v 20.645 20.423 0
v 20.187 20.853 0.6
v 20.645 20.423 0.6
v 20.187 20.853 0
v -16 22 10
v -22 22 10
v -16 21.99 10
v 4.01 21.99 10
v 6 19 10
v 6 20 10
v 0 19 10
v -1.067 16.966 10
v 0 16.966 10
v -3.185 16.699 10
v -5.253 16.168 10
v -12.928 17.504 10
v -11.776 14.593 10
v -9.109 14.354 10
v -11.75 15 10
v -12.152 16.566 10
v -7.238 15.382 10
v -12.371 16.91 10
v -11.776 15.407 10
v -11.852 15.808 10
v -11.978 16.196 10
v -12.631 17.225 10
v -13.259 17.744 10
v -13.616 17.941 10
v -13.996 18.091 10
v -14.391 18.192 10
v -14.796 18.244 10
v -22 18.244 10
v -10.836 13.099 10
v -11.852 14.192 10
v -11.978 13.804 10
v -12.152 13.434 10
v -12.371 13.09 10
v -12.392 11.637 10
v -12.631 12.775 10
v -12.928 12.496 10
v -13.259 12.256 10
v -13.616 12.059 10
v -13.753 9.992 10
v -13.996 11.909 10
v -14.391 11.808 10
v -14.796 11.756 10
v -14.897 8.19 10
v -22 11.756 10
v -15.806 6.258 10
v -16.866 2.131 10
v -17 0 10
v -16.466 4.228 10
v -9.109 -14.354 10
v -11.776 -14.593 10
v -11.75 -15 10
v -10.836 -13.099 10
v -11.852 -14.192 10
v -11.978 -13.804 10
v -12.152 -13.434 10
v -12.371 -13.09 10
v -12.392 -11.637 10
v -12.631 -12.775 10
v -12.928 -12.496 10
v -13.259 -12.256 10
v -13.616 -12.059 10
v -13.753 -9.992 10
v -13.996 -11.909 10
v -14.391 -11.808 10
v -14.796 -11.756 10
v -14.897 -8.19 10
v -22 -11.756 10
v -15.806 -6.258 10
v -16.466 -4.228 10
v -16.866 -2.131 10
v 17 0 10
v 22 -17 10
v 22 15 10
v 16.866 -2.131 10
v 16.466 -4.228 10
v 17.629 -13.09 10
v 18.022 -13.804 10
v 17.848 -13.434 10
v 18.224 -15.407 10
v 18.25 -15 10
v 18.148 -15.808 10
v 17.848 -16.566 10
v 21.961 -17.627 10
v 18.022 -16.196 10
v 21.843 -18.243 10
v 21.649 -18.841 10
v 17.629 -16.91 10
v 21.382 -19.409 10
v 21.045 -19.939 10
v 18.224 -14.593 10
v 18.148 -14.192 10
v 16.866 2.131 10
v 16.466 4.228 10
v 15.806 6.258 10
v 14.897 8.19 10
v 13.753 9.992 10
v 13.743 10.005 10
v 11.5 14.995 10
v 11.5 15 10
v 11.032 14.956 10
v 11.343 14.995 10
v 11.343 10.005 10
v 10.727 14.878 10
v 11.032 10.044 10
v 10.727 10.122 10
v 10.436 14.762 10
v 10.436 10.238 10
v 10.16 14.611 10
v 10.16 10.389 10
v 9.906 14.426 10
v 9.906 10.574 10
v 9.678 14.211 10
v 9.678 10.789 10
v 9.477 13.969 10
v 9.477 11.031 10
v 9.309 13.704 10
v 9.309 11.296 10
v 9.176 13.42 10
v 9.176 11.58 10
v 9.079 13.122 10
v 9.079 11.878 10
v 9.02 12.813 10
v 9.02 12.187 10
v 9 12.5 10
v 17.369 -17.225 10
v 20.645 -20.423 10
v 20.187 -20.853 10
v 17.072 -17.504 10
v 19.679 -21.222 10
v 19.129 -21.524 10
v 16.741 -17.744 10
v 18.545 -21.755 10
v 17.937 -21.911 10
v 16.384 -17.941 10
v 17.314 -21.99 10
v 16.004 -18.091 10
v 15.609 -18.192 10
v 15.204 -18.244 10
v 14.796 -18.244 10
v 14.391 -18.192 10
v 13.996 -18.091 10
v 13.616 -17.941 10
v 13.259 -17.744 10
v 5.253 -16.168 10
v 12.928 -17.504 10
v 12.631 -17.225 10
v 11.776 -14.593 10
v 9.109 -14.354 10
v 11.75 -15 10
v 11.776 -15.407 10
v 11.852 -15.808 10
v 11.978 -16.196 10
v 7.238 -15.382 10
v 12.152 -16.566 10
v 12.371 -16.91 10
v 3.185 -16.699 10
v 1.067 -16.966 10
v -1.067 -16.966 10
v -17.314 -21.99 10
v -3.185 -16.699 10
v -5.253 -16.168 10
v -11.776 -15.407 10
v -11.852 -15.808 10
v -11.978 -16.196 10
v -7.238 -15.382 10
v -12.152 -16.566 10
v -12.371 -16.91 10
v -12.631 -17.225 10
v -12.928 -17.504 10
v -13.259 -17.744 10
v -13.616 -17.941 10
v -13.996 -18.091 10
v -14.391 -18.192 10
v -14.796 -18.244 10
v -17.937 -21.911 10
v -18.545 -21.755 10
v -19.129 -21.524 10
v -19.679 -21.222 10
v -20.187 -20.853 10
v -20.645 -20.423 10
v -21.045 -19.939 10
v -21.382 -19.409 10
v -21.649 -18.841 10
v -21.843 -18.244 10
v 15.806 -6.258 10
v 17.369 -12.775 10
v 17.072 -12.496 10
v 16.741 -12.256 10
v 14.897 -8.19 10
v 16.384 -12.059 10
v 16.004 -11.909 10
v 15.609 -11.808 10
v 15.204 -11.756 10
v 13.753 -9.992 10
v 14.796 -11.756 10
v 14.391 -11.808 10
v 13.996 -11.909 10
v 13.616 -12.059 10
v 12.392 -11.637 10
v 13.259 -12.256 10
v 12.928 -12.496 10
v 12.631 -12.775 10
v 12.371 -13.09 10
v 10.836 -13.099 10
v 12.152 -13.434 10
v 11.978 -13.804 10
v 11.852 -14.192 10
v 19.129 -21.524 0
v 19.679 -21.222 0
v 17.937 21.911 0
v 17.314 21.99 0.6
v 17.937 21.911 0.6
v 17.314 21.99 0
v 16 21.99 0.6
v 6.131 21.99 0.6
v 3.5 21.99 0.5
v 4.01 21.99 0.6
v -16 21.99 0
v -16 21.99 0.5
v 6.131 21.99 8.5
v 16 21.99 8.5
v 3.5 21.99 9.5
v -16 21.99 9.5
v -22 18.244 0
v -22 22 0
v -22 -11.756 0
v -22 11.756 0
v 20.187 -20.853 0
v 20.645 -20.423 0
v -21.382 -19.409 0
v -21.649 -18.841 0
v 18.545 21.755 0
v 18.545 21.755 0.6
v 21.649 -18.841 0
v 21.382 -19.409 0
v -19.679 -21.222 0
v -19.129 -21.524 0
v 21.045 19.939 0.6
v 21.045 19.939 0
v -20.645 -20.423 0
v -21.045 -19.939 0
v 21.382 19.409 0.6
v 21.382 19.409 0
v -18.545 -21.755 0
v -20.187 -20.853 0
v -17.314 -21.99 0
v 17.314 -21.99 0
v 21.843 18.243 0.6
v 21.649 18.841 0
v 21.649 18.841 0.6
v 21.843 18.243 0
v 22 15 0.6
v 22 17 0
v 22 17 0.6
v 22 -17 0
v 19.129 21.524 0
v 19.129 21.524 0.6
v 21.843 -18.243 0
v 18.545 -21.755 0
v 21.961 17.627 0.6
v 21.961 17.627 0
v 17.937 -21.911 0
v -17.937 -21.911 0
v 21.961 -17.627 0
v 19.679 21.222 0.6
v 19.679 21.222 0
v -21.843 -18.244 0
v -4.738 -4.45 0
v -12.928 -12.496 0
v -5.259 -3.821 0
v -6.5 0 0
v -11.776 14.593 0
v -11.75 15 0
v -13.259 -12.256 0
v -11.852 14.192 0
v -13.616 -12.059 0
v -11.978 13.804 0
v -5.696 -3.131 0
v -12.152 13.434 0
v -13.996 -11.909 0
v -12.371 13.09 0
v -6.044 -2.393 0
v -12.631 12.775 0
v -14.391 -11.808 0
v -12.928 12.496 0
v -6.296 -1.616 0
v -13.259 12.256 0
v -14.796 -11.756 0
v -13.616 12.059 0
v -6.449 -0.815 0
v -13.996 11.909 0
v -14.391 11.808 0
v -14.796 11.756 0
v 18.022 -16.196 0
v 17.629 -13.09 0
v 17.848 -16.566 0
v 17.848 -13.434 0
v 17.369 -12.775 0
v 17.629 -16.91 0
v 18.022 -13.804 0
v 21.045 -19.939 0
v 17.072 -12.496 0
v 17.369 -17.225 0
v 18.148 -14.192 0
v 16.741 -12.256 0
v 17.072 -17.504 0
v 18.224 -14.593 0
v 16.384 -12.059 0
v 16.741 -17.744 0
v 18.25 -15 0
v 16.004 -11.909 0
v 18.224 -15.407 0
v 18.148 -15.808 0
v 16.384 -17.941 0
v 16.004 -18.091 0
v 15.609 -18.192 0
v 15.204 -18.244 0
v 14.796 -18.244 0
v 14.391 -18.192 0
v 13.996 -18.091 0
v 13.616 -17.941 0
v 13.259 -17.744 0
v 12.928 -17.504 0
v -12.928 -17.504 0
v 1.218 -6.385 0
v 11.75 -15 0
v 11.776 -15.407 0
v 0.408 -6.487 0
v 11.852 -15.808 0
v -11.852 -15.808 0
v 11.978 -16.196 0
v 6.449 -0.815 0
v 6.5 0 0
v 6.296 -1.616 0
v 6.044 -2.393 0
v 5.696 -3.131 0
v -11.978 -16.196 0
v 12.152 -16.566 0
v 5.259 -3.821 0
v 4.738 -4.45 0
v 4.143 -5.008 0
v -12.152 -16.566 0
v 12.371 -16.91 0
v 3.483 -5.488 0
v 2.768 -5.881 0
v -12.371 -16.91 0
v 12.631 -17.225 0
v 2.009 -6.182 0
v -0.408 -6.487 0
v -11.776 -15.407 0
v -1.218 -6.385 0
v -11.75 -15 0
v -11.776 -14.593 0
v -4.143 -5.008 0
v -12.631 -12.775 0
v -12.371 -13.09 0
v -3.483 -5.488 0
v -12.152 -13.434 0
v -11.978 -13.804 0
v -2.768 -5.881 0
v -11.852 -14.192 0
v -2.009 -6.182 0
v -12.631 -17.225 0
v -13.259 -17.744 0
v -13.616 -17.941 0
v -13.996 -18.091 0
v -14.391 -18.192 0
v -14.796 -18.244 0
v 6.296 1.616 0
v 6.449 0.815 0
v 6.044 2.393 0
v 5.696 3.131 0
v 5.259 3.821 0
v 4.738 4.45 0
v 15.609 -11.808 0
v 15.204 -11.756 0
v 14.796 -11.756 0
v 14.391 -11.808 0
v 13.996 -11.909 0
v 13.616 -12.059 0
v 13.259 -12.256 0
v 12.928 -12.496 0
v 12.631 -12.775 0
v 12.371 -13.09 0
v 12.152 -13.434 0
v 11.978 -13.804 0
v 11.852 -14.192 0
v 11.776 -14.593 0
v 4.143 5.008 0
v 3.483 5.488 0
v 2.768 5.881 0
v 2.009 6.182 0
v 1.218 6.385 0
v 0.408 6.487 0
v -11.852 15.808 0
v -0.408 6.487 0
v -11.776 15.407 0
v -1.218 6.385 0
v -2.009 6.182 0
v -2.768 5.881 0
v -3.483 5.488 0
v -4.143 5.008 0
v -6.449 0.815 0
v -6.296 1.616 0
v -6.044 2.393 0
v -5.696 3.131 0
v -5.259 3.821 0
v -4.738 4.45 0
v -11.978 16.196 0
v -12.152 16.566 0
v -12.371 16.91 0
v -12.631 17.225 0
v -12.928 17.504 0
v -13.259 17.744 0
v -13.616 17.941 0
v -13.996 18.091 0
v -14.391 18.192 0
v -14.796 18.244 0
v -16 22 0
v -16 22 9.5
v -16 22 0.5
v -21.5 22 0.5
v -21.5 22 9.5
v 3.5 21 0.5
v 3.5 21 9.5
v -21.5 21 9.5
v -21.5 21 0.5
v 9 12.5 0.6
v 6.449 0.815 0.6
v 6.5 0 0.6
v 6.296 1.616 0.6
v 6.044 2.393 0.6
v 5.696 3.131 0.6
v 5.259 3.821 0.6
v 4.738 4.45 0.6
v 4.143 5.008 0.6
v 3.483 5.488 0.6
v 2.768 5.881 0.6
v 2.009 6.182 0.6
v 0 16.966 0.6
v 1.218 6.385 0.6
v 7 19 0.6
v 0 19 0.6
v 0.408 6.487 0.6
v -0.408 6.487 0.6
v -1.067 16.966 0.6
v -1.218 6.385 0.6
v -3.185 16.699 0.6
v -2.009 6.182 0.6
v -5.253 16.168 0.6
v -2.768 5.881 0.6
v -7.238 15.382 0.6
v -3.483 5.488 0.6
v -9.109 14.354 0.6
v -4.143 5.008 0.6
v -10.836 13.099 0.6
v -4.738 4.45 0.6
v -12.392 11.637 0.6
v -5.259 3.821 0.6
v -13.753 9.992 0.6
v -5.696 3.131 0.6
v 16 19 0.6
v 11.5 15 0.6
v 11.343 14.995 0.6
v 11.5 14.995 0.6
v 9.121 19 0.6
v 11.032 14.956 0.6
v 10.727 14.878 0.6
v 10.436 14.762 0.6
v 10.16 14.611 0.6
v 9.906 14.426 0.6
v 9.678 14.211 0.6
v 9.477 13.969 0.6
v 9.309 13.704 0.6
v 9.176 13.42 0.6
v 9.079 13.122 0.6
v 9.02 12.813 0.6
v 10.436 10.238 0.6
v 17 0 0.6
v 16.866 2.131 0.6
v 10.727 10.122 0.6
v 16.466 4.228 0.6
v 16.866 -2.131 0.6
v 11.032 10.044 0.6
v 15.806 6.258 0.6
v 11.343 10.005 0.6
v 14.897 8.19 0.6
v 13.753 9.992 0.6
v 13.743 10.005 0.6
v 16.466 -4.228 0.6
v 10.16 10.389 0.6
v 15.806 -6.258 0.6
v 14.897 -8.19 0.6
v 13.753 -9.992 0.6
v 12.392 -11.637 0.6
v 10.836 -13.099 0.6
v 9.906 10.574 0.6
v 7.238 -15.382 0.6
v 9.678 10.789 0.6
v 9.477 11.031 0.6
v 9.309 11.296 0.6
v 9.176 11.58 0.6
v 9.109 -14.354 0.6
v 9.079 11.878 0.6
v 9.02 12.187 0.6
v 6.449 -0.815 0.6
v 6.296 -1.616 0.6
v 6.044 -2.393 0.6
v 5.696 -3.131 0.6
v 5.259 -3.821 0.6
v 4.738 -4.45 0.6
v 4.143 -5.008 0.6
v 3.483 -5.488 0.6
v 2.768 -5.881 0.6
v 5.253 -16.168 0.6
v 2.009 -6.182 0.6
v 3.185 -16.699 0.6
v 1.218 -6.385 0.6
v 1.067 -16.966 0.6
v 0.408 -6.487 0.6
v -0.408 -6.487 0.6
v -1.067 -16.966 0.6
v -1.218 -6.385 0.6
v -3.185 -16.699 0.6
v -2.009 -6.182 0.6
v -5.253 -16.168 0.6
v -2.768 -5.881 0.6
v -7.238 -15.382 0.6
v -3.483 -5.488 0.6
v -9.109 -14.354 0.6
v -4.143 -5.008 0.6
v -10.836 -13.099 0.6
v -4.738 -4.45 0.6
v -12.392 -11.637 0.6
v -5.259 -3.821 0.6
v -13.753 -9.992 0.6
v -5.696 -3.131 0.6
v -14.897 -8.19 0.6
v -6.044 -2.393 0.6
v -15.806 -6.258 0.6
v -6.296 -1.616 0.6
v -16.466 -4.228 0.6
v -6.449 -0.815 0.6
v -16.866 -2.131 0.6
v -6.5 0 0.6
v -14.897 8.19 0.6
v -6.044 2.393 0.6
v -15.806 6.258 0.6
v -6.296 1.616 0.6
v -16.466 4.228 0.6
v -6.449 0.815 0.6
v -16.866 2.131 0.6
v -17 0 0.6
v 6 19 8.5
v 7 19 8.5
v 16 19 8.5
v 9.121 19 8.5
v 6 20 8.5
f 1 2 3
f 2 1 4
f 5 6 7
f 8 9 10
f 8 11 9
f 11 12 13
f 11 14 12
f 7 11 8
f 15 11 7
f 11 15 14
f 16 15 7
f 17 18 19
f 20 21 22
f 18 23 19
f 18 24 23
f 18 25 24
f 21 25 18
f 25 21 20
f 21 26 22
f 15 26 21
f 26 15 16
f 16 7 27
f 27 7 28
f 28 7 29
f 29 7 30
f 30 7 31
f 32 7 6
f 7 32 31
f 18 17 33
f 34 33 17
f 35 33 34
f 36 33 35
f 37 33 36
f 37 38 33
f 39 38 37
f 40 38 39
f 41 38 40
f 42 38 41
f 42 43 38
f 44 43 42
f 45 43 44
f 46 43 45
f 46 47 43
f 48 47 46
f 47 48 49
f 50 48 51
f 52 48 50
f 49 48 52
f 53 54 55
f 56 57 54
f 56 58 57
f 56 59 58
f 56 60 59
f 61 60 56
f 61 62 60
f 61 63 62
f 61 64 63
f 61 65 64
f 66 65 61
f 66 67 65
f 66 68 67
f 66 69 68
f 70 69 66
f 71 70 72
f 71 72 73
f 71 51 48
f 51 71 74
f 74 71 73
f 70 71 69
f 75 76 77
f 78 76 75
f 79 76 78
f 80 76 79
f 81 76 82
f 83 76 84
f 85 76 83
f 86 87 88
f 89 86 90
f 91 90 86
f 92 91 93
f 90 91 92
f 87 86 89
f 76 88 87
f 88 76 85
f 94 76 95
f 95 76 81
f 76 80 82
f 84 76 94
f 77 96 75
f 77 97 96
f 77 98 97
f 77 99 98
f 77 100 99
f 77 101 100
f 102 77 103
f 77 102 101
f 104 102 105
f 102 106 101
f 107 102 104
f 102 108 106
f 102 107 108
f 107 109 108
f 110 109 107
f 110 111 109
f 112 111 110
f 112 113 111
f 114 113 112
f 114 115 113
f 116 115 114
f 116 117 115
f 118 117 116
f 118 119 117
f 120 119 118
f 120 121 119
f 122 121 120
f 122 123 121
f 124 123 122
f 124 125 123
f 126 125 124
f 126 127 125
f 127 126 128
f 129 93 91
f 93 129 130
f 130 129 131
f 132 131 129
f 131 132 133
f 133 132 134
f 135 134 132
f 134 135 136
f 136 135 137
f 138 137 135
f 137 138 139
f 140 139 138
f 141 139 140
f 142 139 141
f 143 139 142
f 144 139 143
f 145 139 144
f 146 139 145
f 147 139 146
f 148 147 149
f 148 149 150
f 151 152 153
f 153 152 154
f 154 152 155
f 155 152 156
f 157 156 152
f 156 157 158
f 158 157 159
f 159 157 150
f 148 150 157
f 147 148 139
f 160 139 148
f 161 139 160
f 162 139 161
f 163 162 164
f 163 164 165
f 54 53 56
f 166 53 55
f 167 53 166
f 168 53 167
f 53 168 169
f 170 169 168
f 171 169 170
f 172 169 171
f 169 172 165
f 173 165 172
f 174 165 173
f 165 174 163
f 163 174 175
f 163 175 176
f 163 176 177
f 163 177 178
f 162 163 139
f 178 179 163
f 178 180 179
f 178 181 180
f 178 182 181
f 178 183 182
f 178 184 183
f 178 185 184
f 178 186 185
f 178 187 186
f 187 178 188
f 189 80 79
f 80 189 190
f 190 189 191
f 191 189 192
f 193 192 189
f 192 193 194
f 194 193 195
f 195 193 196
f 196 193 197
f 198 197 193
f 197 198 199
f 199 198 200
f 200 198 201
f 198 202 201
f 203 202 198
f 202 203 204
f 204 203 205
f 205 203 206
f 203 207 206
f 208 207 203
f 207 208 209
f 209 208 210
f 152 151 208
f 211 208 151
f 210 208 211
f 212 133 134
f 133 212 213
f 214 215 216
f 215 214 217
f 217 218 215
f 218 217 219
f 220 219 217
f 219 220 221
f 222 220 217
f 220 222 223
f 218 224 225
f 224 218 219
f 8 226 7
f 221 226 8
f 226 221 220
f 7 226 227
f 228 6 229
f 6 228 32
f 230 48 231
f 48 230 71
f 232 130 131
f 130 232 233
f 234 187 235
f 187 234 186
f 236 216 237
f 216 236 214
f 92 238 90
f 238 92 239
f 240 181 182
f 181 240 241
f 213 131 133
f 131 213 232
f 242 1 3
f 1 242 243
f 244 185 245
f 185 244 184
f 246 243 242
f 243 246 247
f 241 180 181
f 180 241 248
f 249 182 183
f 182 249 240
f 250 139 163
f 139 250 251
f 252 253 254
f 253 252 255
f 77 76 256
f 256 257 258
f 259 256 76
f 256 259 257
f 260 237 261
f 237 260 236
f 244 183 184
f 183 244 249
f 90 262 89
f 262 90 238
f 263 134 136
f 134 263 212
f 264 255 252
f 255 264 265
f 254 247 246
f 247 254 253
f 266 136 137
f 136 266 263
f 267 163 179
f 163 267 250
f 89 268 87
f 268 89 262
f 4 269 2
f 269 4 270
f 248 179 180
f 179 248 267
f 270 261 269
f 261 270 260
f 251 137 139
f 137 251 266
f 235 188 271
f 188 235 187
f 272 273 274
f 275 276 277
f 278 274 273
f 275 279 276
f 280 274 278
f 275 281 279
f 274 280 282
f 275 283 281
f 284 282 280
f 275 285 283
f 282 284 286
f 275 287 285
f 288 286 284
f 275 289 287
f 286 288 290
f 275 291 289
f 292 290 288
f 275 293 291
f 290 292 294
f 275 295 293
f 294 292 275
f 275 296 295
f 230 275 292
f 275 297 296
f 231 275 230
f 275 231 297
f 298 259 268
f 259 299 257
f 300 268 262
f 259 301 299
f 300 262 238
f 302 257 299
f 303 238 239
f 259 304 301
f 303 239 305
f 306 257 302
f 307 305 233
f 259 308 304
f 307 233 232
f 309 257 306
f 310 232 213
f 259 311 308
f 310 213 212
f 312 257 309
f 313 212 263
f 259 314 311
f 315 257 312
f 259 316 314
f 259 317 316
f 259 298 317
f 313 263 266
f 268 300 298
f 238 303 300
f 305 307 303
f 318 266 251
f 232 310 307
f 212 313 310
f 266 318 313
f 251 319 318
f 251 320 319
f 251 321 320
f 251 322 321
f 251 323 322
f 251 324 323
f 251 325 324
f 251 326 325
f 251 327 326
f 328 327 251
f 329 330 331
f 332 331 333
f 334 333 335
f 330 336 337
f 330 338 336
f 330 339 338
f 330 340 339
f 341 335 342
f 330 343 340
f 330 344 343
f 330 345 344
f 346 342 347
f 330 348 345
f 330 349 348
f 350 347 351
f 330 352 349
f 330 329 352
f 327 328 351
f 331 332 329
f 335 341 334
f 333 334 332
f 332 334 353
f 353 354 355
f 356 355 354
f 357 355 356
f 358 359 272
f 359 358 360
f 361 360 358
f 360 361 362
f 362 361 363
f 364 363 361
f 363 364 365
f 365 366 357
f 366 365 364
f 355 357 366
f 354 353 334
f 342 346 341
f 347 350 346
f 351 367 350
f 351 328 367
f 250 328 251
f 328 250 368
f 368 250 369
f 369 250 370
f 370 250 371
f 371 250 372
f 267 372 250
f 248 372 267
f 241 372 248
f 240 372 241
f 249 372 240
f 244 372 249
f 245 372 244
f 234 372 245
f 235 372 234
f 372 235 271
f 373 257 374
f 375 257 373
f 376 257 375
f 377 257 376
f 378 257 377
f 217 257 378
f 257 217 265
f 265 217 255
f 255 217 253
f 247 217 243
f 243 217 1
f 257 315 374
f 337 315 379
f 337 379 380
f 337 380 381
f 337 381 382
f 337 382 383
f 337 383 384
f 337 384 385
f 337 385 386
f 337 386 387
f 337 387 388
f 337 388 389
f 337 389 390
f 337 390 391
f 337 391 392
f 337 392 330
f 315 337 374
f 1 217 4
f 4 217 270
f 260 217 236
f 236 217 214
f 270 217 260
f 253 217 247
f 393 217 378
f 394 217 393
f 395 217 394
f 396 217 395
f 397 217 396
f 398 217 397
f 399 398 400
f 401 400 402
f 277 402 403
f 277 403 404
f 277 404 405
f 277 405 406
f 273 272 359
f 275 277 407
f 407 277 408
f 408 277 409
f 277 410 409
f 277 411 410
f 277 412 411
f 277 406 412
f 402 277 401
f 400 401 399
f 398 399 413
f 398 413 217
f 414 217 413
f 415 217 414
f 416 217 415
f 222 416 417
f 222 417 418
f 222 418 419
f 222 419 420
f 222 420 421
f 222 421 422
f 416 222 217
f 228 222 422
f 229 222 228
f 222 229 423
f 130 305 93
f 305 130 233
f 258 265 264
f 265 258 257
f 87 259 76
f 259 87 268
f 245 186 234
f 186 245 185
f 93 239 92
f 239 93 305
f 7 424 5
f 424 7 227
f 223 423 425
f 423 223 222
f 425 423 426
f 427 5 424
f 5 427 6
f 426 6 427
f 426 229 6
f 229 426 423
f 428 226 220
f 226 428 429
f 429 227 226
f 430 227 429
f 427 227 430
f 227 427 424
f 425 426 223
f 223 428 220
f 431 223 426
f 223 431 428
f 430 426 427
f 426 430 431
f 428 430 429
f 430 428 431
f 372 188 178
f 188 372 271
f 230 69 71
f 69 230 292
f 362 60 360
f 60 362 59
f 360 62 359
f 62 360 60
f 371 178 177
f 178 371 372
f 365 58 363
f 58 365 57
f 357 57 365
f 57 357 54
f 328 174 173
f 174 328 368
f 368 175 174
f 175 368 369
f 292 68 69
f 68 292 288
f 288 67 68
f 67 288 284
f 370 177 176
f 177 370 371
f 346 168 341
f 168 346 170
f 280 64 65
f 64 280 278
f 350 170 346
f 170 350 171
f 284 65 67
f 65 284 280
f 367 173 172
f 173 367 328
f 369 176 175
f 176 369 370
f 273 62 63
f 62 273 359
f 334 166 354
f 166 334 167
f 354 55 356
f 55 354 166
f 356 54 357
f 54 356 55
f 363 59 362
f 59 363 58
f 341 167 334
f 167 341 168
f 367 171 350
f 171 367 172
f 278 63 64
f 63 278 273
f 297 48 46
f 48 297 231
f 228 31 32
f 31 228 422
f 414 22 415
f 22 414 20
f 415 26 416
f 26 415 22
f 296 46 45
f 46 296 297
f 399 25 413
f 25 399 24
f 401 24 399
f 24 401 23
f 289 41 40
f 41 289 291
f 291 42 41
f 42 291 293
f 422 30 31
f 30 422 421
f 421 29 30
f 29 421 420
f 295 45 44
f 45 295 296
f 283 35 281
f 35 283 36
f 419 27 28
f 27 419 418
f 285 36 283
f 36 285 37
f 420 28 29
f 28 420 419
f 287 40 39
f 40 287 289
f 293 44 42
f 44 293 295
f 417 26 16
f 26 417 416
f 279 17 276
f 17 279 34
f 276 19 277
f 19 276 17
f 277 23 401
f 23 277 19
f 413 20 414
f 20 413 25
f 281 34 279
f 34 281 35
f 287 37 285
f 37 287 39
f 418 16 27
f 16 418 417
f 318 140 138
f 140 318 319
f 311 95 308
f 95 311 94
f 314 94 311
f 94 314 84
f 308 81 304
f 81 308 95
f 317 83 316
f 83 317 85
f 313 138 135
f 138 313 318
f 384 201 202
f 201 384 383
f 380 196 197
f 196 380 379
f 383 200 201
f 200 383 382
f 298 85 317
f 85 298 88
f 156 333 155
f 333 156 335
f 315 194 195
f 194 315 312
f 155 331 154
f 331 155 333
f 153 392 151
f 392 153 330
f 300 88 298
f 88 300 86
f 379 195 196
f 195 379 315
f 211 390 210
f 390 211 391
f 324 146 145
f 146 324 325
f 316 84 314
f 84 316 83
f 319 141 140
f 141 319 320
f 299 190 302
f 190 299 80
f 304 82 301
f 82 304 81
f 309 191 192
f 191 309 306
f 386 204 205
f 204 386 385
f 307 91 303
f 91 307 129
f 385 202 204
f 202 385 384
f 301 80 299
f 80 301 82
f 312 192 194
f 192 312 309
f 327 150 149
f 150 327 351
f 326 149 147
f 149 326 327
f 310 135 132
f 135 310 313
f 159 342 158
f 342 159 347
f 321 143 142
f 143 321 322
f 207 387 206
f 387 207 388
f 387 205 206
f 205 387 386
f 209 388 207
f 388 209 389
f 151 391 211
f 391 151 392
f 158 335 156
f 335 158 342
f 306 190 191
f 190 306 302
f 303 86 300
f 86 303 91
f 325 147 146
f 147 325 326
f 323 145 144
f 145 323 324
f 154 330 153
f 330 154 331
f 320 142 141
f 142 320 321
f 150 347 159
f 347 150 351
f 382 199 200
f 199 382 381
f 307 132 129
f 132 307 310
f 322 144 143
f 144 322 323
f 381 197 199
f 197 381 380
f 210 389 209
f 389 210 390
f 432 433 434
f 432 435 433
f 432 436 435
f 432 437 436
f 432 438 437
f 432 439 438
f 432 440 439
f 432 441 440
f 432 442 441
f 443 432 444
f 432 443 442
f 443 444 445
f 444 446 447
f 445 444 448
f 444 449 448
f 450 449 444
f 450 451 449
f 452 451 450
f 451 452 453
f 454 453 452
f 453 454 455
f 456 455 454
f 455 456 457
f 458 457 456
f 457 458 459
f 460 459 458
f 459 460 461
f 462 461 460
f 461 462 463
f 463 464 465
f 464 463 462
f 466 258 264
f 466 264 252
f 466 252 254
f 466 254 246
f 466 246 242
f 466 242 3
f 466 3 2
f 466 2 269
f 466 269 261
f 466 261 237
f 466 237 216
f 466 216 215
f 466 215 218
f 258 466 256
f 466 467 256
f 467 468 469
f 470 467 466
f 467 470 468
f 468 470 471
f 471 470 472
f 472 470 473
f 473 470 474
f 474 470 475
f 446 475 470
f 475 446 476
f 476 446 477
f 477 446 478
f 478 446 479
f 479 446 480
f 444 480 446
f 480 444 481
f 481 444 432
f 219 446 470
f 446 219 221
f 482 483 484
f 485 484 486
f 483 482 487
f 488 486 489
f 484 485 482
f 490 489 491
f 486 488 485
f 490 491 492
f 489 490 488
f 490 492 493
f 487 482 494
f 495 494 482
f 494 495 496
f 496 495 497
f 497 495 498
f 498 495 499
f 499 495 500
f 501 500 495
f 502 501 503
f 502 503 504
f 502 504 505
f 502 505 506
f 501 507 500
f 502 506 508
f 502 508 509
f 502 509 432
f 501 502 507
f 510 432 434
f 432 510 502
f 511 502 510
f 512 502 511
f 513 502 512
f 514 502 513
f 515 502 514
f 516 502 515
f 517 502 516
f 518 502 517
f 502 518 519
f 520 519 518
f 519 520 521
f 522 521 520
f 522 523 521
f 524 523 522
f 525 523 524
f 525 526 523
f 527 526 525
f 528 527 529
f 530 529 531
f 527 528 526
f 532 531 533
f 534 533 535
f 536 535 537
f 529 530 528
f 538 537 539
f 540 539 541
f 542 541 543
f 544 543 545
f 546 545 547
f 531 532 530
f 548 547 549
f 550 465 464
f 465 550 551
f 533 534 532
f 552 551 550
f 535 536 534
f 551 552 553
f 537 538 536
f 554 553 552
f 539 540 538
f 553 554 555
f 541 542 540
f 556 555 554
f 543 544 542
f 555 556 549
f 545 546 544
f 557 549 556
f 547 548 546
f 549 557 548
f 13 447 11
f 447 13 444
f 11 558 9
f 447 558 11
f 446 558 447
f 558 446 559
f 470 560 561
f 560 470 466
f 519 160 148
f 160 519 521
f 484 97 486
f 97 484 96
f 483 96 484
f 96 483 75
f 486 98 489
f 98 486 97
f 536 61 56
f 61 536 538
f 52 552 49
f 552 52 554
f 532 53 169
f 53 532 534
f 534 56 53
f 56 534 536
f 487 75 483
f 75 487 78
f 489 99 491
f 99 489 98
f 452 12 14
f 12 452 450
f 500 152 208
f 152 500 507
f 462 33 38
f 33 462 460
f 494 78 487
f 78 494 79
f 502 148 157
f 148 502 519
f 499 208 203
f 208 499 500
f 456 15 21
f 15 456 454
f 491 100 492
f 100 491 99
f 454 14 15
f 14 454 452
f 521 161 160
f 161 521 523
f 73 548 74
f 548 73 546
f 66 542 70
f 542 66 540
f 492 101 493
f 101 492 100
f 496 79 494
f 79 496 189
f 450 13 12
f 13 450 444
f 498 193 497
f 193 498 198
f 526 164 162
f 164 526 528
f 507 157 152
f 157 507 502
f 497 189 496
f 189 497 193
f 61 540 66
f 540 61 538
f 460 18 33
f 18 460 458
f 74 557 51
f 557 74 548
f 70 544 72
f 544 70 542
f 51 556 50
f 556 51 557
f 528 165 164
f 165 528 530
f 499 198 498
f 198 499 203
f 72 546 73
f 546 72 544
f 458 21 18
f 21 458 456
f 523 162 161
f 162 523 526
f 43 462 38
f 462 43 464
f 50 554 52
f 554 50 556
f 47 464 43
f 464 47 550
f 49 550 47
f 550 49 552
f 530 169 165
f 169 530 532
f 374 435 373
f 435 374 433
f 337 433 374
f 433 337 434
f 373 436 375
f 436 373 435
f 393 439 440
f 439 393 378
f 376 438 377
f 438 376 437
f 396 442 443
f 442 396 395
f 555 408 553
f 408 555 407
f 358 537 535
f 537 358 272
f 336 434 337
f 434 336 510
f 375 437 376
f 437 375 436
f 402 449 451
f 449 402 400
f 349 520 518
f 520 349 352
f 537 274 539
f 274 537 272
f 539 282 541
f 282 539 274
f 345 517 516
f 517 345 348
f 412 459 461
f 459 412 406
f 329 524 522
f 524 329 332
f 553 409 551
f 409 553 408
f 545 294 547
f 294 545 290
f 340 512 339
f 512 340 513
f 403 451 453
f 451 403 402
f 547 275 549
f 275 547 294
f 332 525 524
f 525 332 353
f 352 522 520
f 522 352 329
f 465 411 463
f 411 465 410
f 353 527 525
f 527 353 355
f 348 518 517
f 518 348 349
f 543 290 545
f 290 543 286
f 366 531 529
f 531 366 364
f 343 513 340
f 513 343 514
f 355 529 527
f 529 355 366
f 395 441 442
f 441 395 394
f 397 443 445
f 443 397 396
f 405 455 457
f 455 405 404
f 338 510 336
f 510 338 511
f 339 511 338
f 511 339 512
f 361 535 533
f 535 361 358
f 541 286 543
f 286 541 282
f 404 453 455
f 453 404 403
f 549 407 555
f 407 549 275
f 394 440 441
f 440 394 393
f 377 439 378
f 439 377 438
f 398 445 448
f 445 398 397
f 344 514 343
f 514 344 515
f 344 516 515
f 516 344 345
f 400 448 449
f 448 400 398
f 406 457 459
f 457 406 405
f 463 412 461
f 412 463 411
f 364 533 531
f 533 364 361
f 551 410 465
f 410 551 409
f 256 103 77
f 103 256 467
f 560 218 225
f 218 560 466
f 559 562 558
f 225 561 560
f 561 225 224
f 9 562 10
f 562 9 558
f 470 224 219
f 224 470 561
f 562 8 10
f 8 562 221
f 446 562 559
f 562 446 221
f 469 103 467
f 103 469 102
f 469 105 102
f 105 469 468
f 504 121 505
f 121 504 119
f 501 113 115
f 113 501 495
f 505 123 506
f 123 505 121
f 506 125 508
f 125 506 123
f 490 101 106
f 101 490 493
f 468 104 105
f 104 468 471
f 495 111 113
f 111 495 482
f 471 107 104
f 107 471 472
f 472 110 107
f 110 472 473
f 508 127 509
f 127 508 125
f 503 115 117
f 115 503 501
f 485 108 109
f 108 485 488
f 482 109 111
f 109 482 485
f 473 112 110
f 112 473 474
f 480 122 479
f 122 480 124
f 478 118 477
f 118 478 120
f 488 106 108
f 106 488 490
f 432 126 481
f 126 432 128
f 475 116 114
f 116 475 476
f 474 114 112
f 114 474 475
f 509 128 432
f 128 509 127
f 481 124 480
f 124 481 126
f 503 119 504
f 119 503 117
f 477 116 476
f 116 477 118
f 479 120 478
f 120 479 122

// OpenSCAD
$fn = 50;


union() {
	difference() {
		union() {
			translate(v = [0, 0, 0]) {
				rotate(a = [0, 0, 0]) {
					hull() {
						translate(v = [-17.0000000000, 17.0000000000, 0]) {
							rotate(a = [0, 0, 0]) {
								translate(v = [0, 0, 0]) {
									rotate(a = [0, 0, 0]) {
										cylinder(h = 10, r = 5);
									}
								}
							}
						}
						translate(v = [17.0000000000, 17.0000000000, 0]) {
							rotate(a = [0, 0, 0]) {
								translate(v = [0, 0, 0]) {
									rotate(a = [0, 0, 0]) {
										cylinder(h = 10, r = 5);
									}
								}
							}
						}
						translate(v = [-17.0000000000, -17.0000000000, 0]) {
							rotate(a = [0, 0, 0]) {
								translate(v = [0, 0, 0]) {
									rotate(a = [0, 0, 0]) {
										cylinder(h = 10, r = 5);
									}
								}
							}
						}
						translate(v = [17.0000000000, -17.0000000000, 0]) {
							rotate(a = [0, 0, 0]) {
								translate(v = [0, 0, 0]) {
									rotate(a = [0, 0, 0]) {
										cylinder(h = 10, r = 5);
									}
								}
							}
						}
					}
				}
			}
			translate(v = [-22.0000000000, 16.0000000000, 0]) {
				rotate(a = [0, 0, 0]) {
					cube(size = [6, 6, 10]);
				}
			}
		}
		union() {
			#translate(v = [-21.5000000000, 21.0000000000, 0.5000000000]) {
				rotate(a = [0, 0, 0]) {
					cube(size = [25, 1, 9.0000000000]);
				}
			}
			translate(v = [-22.5000000000, -15.0000000000, -125]) {
				rotate(a = [0, 0, 0]) {
					hull() {
						translate(v = [7.5000000000, 0, 0]) {
							rotate(a = [0, 0, 0]) {
								translate(v = [0, 0, 0]) {
									rotate(a = [0, 0, 0]) {
										cylinder(h = 250, r = 3.2500000000);
									}
								}
							}
						}
						translate(v = [-7.5000000000, 0, 0]) {
							rotate(a = [0, 0, 0]) {
								translate(v = [0, 0, 0]) {
									rotate(a = [0, 0, 0]) {
										cylinder(h = 250, r = 3.2500000000);
									}
								}
							}
						}
					}
				}
			}
			translate(v = [-22.5000000000, 15.0000000000, -125]) {
				rotate(a = [0, 0, 0]) {
					hull() {
						translate(v = [7.5000000000, 0, 0]) {
							rotate(a = [0, 0, 0]) {
								translate(v = [0, 0, 0]) {
									rotate(a = [0, 0, 0]) {
										cylinder(h = 250, r = 3.2500000000);
									}
								}
							}
						}
						translate(v = [-7.5000000000, 0, 0]) {
							rotate(a = [0, 0, 0]) {
								translate(v = [0, 0, 0]) {
									rotate(a = [0, 0, 0]) {
										cylinder(h = 250, r = 3.2500000000);
									}
								}
							}
						}
					}
				}
			}
			translate(v = [15.0000000000, -15.0000000000, -125.0000000000]) {
				rotate(a = [0, 0, 0]) {
					cylinder(h = 250, r = 3.2500000000);
				}
			}
			translate(v = [0.0000000000, 11.0000000000, 0.6000000000]) {
				rotate(a = [0, 0, 0]) {
					cube(size = [11, 8, 12.4000000000]);
				}
			}
			translate(v = [0, 0, 0.6000000000]) {
				rotate(a = [0, 0, 0]) {
					cylinder(h = 12.4000000000, r = 17.0000000000);
				}
			}
			translate(v = [0, 0, -5.0000000000]) {
				rotate(a = [0, 0, 0]) {
					cylinder(h = 10, r = 6.5000000000);
				}
			}
			translate(v = [0.0000000000, 15.0000000000, 0.6000000000]) {
				rotate(a = [0, 0, 0]) {
					cube(size = [22.0000000000, 4, 12.4000000000]);
				}
			}
			translate(v = [16.0000000000, 15.0000000000, 0.6000000000]) {
				rotate(a = [0, 0, 0]) {
					cube(size = [6, 7, 12.4000000000]);
				}
			}
			translate(v = [6.0000000000, 15.0000000000, 8.5000000000]) {
				rotate(a = [0, 0, 0]) {
					cube(size = [16, 7, 1.5000000000]);
				}
			}
			translate(v = [3.2500000000, 22.7500000000, 0.6000000000]) {
				rotate(a = [0, 0, -45]) {
					cube(size = [7.5000000000, 1.5000000000, 12.4000000000]);
				}
			}
			translate(v = [2.5000000000, 10.0000000000, 0.6000000000]) {
				rotate(a = [0, 0, 0]) {
					cube(size = [9.0000000000, 5, 9.4000000000]);
				}
			}
		}
	}
	union() {
		translate(v = [14, 12.5000000000, 0]) {
			rotate(a = [0, 0, 0]) {
				hull() {
					translate(v = [2.5000000000, 0, 0]) {
						rotate(a = [0, 0, 0]) {
							#translate(v = [0, 0, 0]) {
								rotate(a = [0, 0, 0]) {
									cylinder(h = 10, r = 2.5000000000);
								}
							}
						}
					}
					translate(v = [-2.5000000000, 0, 0]) {
						rotate(a = [0, 0, 0]) {
							#translate(v = [0, 0, 0]) {
								rotate(a = [0, 0, 0]) {
									cylinder(h = 10, r = 2.5000000000);
								}
							}
						}
					}
				}
			}
		}
	}
}
